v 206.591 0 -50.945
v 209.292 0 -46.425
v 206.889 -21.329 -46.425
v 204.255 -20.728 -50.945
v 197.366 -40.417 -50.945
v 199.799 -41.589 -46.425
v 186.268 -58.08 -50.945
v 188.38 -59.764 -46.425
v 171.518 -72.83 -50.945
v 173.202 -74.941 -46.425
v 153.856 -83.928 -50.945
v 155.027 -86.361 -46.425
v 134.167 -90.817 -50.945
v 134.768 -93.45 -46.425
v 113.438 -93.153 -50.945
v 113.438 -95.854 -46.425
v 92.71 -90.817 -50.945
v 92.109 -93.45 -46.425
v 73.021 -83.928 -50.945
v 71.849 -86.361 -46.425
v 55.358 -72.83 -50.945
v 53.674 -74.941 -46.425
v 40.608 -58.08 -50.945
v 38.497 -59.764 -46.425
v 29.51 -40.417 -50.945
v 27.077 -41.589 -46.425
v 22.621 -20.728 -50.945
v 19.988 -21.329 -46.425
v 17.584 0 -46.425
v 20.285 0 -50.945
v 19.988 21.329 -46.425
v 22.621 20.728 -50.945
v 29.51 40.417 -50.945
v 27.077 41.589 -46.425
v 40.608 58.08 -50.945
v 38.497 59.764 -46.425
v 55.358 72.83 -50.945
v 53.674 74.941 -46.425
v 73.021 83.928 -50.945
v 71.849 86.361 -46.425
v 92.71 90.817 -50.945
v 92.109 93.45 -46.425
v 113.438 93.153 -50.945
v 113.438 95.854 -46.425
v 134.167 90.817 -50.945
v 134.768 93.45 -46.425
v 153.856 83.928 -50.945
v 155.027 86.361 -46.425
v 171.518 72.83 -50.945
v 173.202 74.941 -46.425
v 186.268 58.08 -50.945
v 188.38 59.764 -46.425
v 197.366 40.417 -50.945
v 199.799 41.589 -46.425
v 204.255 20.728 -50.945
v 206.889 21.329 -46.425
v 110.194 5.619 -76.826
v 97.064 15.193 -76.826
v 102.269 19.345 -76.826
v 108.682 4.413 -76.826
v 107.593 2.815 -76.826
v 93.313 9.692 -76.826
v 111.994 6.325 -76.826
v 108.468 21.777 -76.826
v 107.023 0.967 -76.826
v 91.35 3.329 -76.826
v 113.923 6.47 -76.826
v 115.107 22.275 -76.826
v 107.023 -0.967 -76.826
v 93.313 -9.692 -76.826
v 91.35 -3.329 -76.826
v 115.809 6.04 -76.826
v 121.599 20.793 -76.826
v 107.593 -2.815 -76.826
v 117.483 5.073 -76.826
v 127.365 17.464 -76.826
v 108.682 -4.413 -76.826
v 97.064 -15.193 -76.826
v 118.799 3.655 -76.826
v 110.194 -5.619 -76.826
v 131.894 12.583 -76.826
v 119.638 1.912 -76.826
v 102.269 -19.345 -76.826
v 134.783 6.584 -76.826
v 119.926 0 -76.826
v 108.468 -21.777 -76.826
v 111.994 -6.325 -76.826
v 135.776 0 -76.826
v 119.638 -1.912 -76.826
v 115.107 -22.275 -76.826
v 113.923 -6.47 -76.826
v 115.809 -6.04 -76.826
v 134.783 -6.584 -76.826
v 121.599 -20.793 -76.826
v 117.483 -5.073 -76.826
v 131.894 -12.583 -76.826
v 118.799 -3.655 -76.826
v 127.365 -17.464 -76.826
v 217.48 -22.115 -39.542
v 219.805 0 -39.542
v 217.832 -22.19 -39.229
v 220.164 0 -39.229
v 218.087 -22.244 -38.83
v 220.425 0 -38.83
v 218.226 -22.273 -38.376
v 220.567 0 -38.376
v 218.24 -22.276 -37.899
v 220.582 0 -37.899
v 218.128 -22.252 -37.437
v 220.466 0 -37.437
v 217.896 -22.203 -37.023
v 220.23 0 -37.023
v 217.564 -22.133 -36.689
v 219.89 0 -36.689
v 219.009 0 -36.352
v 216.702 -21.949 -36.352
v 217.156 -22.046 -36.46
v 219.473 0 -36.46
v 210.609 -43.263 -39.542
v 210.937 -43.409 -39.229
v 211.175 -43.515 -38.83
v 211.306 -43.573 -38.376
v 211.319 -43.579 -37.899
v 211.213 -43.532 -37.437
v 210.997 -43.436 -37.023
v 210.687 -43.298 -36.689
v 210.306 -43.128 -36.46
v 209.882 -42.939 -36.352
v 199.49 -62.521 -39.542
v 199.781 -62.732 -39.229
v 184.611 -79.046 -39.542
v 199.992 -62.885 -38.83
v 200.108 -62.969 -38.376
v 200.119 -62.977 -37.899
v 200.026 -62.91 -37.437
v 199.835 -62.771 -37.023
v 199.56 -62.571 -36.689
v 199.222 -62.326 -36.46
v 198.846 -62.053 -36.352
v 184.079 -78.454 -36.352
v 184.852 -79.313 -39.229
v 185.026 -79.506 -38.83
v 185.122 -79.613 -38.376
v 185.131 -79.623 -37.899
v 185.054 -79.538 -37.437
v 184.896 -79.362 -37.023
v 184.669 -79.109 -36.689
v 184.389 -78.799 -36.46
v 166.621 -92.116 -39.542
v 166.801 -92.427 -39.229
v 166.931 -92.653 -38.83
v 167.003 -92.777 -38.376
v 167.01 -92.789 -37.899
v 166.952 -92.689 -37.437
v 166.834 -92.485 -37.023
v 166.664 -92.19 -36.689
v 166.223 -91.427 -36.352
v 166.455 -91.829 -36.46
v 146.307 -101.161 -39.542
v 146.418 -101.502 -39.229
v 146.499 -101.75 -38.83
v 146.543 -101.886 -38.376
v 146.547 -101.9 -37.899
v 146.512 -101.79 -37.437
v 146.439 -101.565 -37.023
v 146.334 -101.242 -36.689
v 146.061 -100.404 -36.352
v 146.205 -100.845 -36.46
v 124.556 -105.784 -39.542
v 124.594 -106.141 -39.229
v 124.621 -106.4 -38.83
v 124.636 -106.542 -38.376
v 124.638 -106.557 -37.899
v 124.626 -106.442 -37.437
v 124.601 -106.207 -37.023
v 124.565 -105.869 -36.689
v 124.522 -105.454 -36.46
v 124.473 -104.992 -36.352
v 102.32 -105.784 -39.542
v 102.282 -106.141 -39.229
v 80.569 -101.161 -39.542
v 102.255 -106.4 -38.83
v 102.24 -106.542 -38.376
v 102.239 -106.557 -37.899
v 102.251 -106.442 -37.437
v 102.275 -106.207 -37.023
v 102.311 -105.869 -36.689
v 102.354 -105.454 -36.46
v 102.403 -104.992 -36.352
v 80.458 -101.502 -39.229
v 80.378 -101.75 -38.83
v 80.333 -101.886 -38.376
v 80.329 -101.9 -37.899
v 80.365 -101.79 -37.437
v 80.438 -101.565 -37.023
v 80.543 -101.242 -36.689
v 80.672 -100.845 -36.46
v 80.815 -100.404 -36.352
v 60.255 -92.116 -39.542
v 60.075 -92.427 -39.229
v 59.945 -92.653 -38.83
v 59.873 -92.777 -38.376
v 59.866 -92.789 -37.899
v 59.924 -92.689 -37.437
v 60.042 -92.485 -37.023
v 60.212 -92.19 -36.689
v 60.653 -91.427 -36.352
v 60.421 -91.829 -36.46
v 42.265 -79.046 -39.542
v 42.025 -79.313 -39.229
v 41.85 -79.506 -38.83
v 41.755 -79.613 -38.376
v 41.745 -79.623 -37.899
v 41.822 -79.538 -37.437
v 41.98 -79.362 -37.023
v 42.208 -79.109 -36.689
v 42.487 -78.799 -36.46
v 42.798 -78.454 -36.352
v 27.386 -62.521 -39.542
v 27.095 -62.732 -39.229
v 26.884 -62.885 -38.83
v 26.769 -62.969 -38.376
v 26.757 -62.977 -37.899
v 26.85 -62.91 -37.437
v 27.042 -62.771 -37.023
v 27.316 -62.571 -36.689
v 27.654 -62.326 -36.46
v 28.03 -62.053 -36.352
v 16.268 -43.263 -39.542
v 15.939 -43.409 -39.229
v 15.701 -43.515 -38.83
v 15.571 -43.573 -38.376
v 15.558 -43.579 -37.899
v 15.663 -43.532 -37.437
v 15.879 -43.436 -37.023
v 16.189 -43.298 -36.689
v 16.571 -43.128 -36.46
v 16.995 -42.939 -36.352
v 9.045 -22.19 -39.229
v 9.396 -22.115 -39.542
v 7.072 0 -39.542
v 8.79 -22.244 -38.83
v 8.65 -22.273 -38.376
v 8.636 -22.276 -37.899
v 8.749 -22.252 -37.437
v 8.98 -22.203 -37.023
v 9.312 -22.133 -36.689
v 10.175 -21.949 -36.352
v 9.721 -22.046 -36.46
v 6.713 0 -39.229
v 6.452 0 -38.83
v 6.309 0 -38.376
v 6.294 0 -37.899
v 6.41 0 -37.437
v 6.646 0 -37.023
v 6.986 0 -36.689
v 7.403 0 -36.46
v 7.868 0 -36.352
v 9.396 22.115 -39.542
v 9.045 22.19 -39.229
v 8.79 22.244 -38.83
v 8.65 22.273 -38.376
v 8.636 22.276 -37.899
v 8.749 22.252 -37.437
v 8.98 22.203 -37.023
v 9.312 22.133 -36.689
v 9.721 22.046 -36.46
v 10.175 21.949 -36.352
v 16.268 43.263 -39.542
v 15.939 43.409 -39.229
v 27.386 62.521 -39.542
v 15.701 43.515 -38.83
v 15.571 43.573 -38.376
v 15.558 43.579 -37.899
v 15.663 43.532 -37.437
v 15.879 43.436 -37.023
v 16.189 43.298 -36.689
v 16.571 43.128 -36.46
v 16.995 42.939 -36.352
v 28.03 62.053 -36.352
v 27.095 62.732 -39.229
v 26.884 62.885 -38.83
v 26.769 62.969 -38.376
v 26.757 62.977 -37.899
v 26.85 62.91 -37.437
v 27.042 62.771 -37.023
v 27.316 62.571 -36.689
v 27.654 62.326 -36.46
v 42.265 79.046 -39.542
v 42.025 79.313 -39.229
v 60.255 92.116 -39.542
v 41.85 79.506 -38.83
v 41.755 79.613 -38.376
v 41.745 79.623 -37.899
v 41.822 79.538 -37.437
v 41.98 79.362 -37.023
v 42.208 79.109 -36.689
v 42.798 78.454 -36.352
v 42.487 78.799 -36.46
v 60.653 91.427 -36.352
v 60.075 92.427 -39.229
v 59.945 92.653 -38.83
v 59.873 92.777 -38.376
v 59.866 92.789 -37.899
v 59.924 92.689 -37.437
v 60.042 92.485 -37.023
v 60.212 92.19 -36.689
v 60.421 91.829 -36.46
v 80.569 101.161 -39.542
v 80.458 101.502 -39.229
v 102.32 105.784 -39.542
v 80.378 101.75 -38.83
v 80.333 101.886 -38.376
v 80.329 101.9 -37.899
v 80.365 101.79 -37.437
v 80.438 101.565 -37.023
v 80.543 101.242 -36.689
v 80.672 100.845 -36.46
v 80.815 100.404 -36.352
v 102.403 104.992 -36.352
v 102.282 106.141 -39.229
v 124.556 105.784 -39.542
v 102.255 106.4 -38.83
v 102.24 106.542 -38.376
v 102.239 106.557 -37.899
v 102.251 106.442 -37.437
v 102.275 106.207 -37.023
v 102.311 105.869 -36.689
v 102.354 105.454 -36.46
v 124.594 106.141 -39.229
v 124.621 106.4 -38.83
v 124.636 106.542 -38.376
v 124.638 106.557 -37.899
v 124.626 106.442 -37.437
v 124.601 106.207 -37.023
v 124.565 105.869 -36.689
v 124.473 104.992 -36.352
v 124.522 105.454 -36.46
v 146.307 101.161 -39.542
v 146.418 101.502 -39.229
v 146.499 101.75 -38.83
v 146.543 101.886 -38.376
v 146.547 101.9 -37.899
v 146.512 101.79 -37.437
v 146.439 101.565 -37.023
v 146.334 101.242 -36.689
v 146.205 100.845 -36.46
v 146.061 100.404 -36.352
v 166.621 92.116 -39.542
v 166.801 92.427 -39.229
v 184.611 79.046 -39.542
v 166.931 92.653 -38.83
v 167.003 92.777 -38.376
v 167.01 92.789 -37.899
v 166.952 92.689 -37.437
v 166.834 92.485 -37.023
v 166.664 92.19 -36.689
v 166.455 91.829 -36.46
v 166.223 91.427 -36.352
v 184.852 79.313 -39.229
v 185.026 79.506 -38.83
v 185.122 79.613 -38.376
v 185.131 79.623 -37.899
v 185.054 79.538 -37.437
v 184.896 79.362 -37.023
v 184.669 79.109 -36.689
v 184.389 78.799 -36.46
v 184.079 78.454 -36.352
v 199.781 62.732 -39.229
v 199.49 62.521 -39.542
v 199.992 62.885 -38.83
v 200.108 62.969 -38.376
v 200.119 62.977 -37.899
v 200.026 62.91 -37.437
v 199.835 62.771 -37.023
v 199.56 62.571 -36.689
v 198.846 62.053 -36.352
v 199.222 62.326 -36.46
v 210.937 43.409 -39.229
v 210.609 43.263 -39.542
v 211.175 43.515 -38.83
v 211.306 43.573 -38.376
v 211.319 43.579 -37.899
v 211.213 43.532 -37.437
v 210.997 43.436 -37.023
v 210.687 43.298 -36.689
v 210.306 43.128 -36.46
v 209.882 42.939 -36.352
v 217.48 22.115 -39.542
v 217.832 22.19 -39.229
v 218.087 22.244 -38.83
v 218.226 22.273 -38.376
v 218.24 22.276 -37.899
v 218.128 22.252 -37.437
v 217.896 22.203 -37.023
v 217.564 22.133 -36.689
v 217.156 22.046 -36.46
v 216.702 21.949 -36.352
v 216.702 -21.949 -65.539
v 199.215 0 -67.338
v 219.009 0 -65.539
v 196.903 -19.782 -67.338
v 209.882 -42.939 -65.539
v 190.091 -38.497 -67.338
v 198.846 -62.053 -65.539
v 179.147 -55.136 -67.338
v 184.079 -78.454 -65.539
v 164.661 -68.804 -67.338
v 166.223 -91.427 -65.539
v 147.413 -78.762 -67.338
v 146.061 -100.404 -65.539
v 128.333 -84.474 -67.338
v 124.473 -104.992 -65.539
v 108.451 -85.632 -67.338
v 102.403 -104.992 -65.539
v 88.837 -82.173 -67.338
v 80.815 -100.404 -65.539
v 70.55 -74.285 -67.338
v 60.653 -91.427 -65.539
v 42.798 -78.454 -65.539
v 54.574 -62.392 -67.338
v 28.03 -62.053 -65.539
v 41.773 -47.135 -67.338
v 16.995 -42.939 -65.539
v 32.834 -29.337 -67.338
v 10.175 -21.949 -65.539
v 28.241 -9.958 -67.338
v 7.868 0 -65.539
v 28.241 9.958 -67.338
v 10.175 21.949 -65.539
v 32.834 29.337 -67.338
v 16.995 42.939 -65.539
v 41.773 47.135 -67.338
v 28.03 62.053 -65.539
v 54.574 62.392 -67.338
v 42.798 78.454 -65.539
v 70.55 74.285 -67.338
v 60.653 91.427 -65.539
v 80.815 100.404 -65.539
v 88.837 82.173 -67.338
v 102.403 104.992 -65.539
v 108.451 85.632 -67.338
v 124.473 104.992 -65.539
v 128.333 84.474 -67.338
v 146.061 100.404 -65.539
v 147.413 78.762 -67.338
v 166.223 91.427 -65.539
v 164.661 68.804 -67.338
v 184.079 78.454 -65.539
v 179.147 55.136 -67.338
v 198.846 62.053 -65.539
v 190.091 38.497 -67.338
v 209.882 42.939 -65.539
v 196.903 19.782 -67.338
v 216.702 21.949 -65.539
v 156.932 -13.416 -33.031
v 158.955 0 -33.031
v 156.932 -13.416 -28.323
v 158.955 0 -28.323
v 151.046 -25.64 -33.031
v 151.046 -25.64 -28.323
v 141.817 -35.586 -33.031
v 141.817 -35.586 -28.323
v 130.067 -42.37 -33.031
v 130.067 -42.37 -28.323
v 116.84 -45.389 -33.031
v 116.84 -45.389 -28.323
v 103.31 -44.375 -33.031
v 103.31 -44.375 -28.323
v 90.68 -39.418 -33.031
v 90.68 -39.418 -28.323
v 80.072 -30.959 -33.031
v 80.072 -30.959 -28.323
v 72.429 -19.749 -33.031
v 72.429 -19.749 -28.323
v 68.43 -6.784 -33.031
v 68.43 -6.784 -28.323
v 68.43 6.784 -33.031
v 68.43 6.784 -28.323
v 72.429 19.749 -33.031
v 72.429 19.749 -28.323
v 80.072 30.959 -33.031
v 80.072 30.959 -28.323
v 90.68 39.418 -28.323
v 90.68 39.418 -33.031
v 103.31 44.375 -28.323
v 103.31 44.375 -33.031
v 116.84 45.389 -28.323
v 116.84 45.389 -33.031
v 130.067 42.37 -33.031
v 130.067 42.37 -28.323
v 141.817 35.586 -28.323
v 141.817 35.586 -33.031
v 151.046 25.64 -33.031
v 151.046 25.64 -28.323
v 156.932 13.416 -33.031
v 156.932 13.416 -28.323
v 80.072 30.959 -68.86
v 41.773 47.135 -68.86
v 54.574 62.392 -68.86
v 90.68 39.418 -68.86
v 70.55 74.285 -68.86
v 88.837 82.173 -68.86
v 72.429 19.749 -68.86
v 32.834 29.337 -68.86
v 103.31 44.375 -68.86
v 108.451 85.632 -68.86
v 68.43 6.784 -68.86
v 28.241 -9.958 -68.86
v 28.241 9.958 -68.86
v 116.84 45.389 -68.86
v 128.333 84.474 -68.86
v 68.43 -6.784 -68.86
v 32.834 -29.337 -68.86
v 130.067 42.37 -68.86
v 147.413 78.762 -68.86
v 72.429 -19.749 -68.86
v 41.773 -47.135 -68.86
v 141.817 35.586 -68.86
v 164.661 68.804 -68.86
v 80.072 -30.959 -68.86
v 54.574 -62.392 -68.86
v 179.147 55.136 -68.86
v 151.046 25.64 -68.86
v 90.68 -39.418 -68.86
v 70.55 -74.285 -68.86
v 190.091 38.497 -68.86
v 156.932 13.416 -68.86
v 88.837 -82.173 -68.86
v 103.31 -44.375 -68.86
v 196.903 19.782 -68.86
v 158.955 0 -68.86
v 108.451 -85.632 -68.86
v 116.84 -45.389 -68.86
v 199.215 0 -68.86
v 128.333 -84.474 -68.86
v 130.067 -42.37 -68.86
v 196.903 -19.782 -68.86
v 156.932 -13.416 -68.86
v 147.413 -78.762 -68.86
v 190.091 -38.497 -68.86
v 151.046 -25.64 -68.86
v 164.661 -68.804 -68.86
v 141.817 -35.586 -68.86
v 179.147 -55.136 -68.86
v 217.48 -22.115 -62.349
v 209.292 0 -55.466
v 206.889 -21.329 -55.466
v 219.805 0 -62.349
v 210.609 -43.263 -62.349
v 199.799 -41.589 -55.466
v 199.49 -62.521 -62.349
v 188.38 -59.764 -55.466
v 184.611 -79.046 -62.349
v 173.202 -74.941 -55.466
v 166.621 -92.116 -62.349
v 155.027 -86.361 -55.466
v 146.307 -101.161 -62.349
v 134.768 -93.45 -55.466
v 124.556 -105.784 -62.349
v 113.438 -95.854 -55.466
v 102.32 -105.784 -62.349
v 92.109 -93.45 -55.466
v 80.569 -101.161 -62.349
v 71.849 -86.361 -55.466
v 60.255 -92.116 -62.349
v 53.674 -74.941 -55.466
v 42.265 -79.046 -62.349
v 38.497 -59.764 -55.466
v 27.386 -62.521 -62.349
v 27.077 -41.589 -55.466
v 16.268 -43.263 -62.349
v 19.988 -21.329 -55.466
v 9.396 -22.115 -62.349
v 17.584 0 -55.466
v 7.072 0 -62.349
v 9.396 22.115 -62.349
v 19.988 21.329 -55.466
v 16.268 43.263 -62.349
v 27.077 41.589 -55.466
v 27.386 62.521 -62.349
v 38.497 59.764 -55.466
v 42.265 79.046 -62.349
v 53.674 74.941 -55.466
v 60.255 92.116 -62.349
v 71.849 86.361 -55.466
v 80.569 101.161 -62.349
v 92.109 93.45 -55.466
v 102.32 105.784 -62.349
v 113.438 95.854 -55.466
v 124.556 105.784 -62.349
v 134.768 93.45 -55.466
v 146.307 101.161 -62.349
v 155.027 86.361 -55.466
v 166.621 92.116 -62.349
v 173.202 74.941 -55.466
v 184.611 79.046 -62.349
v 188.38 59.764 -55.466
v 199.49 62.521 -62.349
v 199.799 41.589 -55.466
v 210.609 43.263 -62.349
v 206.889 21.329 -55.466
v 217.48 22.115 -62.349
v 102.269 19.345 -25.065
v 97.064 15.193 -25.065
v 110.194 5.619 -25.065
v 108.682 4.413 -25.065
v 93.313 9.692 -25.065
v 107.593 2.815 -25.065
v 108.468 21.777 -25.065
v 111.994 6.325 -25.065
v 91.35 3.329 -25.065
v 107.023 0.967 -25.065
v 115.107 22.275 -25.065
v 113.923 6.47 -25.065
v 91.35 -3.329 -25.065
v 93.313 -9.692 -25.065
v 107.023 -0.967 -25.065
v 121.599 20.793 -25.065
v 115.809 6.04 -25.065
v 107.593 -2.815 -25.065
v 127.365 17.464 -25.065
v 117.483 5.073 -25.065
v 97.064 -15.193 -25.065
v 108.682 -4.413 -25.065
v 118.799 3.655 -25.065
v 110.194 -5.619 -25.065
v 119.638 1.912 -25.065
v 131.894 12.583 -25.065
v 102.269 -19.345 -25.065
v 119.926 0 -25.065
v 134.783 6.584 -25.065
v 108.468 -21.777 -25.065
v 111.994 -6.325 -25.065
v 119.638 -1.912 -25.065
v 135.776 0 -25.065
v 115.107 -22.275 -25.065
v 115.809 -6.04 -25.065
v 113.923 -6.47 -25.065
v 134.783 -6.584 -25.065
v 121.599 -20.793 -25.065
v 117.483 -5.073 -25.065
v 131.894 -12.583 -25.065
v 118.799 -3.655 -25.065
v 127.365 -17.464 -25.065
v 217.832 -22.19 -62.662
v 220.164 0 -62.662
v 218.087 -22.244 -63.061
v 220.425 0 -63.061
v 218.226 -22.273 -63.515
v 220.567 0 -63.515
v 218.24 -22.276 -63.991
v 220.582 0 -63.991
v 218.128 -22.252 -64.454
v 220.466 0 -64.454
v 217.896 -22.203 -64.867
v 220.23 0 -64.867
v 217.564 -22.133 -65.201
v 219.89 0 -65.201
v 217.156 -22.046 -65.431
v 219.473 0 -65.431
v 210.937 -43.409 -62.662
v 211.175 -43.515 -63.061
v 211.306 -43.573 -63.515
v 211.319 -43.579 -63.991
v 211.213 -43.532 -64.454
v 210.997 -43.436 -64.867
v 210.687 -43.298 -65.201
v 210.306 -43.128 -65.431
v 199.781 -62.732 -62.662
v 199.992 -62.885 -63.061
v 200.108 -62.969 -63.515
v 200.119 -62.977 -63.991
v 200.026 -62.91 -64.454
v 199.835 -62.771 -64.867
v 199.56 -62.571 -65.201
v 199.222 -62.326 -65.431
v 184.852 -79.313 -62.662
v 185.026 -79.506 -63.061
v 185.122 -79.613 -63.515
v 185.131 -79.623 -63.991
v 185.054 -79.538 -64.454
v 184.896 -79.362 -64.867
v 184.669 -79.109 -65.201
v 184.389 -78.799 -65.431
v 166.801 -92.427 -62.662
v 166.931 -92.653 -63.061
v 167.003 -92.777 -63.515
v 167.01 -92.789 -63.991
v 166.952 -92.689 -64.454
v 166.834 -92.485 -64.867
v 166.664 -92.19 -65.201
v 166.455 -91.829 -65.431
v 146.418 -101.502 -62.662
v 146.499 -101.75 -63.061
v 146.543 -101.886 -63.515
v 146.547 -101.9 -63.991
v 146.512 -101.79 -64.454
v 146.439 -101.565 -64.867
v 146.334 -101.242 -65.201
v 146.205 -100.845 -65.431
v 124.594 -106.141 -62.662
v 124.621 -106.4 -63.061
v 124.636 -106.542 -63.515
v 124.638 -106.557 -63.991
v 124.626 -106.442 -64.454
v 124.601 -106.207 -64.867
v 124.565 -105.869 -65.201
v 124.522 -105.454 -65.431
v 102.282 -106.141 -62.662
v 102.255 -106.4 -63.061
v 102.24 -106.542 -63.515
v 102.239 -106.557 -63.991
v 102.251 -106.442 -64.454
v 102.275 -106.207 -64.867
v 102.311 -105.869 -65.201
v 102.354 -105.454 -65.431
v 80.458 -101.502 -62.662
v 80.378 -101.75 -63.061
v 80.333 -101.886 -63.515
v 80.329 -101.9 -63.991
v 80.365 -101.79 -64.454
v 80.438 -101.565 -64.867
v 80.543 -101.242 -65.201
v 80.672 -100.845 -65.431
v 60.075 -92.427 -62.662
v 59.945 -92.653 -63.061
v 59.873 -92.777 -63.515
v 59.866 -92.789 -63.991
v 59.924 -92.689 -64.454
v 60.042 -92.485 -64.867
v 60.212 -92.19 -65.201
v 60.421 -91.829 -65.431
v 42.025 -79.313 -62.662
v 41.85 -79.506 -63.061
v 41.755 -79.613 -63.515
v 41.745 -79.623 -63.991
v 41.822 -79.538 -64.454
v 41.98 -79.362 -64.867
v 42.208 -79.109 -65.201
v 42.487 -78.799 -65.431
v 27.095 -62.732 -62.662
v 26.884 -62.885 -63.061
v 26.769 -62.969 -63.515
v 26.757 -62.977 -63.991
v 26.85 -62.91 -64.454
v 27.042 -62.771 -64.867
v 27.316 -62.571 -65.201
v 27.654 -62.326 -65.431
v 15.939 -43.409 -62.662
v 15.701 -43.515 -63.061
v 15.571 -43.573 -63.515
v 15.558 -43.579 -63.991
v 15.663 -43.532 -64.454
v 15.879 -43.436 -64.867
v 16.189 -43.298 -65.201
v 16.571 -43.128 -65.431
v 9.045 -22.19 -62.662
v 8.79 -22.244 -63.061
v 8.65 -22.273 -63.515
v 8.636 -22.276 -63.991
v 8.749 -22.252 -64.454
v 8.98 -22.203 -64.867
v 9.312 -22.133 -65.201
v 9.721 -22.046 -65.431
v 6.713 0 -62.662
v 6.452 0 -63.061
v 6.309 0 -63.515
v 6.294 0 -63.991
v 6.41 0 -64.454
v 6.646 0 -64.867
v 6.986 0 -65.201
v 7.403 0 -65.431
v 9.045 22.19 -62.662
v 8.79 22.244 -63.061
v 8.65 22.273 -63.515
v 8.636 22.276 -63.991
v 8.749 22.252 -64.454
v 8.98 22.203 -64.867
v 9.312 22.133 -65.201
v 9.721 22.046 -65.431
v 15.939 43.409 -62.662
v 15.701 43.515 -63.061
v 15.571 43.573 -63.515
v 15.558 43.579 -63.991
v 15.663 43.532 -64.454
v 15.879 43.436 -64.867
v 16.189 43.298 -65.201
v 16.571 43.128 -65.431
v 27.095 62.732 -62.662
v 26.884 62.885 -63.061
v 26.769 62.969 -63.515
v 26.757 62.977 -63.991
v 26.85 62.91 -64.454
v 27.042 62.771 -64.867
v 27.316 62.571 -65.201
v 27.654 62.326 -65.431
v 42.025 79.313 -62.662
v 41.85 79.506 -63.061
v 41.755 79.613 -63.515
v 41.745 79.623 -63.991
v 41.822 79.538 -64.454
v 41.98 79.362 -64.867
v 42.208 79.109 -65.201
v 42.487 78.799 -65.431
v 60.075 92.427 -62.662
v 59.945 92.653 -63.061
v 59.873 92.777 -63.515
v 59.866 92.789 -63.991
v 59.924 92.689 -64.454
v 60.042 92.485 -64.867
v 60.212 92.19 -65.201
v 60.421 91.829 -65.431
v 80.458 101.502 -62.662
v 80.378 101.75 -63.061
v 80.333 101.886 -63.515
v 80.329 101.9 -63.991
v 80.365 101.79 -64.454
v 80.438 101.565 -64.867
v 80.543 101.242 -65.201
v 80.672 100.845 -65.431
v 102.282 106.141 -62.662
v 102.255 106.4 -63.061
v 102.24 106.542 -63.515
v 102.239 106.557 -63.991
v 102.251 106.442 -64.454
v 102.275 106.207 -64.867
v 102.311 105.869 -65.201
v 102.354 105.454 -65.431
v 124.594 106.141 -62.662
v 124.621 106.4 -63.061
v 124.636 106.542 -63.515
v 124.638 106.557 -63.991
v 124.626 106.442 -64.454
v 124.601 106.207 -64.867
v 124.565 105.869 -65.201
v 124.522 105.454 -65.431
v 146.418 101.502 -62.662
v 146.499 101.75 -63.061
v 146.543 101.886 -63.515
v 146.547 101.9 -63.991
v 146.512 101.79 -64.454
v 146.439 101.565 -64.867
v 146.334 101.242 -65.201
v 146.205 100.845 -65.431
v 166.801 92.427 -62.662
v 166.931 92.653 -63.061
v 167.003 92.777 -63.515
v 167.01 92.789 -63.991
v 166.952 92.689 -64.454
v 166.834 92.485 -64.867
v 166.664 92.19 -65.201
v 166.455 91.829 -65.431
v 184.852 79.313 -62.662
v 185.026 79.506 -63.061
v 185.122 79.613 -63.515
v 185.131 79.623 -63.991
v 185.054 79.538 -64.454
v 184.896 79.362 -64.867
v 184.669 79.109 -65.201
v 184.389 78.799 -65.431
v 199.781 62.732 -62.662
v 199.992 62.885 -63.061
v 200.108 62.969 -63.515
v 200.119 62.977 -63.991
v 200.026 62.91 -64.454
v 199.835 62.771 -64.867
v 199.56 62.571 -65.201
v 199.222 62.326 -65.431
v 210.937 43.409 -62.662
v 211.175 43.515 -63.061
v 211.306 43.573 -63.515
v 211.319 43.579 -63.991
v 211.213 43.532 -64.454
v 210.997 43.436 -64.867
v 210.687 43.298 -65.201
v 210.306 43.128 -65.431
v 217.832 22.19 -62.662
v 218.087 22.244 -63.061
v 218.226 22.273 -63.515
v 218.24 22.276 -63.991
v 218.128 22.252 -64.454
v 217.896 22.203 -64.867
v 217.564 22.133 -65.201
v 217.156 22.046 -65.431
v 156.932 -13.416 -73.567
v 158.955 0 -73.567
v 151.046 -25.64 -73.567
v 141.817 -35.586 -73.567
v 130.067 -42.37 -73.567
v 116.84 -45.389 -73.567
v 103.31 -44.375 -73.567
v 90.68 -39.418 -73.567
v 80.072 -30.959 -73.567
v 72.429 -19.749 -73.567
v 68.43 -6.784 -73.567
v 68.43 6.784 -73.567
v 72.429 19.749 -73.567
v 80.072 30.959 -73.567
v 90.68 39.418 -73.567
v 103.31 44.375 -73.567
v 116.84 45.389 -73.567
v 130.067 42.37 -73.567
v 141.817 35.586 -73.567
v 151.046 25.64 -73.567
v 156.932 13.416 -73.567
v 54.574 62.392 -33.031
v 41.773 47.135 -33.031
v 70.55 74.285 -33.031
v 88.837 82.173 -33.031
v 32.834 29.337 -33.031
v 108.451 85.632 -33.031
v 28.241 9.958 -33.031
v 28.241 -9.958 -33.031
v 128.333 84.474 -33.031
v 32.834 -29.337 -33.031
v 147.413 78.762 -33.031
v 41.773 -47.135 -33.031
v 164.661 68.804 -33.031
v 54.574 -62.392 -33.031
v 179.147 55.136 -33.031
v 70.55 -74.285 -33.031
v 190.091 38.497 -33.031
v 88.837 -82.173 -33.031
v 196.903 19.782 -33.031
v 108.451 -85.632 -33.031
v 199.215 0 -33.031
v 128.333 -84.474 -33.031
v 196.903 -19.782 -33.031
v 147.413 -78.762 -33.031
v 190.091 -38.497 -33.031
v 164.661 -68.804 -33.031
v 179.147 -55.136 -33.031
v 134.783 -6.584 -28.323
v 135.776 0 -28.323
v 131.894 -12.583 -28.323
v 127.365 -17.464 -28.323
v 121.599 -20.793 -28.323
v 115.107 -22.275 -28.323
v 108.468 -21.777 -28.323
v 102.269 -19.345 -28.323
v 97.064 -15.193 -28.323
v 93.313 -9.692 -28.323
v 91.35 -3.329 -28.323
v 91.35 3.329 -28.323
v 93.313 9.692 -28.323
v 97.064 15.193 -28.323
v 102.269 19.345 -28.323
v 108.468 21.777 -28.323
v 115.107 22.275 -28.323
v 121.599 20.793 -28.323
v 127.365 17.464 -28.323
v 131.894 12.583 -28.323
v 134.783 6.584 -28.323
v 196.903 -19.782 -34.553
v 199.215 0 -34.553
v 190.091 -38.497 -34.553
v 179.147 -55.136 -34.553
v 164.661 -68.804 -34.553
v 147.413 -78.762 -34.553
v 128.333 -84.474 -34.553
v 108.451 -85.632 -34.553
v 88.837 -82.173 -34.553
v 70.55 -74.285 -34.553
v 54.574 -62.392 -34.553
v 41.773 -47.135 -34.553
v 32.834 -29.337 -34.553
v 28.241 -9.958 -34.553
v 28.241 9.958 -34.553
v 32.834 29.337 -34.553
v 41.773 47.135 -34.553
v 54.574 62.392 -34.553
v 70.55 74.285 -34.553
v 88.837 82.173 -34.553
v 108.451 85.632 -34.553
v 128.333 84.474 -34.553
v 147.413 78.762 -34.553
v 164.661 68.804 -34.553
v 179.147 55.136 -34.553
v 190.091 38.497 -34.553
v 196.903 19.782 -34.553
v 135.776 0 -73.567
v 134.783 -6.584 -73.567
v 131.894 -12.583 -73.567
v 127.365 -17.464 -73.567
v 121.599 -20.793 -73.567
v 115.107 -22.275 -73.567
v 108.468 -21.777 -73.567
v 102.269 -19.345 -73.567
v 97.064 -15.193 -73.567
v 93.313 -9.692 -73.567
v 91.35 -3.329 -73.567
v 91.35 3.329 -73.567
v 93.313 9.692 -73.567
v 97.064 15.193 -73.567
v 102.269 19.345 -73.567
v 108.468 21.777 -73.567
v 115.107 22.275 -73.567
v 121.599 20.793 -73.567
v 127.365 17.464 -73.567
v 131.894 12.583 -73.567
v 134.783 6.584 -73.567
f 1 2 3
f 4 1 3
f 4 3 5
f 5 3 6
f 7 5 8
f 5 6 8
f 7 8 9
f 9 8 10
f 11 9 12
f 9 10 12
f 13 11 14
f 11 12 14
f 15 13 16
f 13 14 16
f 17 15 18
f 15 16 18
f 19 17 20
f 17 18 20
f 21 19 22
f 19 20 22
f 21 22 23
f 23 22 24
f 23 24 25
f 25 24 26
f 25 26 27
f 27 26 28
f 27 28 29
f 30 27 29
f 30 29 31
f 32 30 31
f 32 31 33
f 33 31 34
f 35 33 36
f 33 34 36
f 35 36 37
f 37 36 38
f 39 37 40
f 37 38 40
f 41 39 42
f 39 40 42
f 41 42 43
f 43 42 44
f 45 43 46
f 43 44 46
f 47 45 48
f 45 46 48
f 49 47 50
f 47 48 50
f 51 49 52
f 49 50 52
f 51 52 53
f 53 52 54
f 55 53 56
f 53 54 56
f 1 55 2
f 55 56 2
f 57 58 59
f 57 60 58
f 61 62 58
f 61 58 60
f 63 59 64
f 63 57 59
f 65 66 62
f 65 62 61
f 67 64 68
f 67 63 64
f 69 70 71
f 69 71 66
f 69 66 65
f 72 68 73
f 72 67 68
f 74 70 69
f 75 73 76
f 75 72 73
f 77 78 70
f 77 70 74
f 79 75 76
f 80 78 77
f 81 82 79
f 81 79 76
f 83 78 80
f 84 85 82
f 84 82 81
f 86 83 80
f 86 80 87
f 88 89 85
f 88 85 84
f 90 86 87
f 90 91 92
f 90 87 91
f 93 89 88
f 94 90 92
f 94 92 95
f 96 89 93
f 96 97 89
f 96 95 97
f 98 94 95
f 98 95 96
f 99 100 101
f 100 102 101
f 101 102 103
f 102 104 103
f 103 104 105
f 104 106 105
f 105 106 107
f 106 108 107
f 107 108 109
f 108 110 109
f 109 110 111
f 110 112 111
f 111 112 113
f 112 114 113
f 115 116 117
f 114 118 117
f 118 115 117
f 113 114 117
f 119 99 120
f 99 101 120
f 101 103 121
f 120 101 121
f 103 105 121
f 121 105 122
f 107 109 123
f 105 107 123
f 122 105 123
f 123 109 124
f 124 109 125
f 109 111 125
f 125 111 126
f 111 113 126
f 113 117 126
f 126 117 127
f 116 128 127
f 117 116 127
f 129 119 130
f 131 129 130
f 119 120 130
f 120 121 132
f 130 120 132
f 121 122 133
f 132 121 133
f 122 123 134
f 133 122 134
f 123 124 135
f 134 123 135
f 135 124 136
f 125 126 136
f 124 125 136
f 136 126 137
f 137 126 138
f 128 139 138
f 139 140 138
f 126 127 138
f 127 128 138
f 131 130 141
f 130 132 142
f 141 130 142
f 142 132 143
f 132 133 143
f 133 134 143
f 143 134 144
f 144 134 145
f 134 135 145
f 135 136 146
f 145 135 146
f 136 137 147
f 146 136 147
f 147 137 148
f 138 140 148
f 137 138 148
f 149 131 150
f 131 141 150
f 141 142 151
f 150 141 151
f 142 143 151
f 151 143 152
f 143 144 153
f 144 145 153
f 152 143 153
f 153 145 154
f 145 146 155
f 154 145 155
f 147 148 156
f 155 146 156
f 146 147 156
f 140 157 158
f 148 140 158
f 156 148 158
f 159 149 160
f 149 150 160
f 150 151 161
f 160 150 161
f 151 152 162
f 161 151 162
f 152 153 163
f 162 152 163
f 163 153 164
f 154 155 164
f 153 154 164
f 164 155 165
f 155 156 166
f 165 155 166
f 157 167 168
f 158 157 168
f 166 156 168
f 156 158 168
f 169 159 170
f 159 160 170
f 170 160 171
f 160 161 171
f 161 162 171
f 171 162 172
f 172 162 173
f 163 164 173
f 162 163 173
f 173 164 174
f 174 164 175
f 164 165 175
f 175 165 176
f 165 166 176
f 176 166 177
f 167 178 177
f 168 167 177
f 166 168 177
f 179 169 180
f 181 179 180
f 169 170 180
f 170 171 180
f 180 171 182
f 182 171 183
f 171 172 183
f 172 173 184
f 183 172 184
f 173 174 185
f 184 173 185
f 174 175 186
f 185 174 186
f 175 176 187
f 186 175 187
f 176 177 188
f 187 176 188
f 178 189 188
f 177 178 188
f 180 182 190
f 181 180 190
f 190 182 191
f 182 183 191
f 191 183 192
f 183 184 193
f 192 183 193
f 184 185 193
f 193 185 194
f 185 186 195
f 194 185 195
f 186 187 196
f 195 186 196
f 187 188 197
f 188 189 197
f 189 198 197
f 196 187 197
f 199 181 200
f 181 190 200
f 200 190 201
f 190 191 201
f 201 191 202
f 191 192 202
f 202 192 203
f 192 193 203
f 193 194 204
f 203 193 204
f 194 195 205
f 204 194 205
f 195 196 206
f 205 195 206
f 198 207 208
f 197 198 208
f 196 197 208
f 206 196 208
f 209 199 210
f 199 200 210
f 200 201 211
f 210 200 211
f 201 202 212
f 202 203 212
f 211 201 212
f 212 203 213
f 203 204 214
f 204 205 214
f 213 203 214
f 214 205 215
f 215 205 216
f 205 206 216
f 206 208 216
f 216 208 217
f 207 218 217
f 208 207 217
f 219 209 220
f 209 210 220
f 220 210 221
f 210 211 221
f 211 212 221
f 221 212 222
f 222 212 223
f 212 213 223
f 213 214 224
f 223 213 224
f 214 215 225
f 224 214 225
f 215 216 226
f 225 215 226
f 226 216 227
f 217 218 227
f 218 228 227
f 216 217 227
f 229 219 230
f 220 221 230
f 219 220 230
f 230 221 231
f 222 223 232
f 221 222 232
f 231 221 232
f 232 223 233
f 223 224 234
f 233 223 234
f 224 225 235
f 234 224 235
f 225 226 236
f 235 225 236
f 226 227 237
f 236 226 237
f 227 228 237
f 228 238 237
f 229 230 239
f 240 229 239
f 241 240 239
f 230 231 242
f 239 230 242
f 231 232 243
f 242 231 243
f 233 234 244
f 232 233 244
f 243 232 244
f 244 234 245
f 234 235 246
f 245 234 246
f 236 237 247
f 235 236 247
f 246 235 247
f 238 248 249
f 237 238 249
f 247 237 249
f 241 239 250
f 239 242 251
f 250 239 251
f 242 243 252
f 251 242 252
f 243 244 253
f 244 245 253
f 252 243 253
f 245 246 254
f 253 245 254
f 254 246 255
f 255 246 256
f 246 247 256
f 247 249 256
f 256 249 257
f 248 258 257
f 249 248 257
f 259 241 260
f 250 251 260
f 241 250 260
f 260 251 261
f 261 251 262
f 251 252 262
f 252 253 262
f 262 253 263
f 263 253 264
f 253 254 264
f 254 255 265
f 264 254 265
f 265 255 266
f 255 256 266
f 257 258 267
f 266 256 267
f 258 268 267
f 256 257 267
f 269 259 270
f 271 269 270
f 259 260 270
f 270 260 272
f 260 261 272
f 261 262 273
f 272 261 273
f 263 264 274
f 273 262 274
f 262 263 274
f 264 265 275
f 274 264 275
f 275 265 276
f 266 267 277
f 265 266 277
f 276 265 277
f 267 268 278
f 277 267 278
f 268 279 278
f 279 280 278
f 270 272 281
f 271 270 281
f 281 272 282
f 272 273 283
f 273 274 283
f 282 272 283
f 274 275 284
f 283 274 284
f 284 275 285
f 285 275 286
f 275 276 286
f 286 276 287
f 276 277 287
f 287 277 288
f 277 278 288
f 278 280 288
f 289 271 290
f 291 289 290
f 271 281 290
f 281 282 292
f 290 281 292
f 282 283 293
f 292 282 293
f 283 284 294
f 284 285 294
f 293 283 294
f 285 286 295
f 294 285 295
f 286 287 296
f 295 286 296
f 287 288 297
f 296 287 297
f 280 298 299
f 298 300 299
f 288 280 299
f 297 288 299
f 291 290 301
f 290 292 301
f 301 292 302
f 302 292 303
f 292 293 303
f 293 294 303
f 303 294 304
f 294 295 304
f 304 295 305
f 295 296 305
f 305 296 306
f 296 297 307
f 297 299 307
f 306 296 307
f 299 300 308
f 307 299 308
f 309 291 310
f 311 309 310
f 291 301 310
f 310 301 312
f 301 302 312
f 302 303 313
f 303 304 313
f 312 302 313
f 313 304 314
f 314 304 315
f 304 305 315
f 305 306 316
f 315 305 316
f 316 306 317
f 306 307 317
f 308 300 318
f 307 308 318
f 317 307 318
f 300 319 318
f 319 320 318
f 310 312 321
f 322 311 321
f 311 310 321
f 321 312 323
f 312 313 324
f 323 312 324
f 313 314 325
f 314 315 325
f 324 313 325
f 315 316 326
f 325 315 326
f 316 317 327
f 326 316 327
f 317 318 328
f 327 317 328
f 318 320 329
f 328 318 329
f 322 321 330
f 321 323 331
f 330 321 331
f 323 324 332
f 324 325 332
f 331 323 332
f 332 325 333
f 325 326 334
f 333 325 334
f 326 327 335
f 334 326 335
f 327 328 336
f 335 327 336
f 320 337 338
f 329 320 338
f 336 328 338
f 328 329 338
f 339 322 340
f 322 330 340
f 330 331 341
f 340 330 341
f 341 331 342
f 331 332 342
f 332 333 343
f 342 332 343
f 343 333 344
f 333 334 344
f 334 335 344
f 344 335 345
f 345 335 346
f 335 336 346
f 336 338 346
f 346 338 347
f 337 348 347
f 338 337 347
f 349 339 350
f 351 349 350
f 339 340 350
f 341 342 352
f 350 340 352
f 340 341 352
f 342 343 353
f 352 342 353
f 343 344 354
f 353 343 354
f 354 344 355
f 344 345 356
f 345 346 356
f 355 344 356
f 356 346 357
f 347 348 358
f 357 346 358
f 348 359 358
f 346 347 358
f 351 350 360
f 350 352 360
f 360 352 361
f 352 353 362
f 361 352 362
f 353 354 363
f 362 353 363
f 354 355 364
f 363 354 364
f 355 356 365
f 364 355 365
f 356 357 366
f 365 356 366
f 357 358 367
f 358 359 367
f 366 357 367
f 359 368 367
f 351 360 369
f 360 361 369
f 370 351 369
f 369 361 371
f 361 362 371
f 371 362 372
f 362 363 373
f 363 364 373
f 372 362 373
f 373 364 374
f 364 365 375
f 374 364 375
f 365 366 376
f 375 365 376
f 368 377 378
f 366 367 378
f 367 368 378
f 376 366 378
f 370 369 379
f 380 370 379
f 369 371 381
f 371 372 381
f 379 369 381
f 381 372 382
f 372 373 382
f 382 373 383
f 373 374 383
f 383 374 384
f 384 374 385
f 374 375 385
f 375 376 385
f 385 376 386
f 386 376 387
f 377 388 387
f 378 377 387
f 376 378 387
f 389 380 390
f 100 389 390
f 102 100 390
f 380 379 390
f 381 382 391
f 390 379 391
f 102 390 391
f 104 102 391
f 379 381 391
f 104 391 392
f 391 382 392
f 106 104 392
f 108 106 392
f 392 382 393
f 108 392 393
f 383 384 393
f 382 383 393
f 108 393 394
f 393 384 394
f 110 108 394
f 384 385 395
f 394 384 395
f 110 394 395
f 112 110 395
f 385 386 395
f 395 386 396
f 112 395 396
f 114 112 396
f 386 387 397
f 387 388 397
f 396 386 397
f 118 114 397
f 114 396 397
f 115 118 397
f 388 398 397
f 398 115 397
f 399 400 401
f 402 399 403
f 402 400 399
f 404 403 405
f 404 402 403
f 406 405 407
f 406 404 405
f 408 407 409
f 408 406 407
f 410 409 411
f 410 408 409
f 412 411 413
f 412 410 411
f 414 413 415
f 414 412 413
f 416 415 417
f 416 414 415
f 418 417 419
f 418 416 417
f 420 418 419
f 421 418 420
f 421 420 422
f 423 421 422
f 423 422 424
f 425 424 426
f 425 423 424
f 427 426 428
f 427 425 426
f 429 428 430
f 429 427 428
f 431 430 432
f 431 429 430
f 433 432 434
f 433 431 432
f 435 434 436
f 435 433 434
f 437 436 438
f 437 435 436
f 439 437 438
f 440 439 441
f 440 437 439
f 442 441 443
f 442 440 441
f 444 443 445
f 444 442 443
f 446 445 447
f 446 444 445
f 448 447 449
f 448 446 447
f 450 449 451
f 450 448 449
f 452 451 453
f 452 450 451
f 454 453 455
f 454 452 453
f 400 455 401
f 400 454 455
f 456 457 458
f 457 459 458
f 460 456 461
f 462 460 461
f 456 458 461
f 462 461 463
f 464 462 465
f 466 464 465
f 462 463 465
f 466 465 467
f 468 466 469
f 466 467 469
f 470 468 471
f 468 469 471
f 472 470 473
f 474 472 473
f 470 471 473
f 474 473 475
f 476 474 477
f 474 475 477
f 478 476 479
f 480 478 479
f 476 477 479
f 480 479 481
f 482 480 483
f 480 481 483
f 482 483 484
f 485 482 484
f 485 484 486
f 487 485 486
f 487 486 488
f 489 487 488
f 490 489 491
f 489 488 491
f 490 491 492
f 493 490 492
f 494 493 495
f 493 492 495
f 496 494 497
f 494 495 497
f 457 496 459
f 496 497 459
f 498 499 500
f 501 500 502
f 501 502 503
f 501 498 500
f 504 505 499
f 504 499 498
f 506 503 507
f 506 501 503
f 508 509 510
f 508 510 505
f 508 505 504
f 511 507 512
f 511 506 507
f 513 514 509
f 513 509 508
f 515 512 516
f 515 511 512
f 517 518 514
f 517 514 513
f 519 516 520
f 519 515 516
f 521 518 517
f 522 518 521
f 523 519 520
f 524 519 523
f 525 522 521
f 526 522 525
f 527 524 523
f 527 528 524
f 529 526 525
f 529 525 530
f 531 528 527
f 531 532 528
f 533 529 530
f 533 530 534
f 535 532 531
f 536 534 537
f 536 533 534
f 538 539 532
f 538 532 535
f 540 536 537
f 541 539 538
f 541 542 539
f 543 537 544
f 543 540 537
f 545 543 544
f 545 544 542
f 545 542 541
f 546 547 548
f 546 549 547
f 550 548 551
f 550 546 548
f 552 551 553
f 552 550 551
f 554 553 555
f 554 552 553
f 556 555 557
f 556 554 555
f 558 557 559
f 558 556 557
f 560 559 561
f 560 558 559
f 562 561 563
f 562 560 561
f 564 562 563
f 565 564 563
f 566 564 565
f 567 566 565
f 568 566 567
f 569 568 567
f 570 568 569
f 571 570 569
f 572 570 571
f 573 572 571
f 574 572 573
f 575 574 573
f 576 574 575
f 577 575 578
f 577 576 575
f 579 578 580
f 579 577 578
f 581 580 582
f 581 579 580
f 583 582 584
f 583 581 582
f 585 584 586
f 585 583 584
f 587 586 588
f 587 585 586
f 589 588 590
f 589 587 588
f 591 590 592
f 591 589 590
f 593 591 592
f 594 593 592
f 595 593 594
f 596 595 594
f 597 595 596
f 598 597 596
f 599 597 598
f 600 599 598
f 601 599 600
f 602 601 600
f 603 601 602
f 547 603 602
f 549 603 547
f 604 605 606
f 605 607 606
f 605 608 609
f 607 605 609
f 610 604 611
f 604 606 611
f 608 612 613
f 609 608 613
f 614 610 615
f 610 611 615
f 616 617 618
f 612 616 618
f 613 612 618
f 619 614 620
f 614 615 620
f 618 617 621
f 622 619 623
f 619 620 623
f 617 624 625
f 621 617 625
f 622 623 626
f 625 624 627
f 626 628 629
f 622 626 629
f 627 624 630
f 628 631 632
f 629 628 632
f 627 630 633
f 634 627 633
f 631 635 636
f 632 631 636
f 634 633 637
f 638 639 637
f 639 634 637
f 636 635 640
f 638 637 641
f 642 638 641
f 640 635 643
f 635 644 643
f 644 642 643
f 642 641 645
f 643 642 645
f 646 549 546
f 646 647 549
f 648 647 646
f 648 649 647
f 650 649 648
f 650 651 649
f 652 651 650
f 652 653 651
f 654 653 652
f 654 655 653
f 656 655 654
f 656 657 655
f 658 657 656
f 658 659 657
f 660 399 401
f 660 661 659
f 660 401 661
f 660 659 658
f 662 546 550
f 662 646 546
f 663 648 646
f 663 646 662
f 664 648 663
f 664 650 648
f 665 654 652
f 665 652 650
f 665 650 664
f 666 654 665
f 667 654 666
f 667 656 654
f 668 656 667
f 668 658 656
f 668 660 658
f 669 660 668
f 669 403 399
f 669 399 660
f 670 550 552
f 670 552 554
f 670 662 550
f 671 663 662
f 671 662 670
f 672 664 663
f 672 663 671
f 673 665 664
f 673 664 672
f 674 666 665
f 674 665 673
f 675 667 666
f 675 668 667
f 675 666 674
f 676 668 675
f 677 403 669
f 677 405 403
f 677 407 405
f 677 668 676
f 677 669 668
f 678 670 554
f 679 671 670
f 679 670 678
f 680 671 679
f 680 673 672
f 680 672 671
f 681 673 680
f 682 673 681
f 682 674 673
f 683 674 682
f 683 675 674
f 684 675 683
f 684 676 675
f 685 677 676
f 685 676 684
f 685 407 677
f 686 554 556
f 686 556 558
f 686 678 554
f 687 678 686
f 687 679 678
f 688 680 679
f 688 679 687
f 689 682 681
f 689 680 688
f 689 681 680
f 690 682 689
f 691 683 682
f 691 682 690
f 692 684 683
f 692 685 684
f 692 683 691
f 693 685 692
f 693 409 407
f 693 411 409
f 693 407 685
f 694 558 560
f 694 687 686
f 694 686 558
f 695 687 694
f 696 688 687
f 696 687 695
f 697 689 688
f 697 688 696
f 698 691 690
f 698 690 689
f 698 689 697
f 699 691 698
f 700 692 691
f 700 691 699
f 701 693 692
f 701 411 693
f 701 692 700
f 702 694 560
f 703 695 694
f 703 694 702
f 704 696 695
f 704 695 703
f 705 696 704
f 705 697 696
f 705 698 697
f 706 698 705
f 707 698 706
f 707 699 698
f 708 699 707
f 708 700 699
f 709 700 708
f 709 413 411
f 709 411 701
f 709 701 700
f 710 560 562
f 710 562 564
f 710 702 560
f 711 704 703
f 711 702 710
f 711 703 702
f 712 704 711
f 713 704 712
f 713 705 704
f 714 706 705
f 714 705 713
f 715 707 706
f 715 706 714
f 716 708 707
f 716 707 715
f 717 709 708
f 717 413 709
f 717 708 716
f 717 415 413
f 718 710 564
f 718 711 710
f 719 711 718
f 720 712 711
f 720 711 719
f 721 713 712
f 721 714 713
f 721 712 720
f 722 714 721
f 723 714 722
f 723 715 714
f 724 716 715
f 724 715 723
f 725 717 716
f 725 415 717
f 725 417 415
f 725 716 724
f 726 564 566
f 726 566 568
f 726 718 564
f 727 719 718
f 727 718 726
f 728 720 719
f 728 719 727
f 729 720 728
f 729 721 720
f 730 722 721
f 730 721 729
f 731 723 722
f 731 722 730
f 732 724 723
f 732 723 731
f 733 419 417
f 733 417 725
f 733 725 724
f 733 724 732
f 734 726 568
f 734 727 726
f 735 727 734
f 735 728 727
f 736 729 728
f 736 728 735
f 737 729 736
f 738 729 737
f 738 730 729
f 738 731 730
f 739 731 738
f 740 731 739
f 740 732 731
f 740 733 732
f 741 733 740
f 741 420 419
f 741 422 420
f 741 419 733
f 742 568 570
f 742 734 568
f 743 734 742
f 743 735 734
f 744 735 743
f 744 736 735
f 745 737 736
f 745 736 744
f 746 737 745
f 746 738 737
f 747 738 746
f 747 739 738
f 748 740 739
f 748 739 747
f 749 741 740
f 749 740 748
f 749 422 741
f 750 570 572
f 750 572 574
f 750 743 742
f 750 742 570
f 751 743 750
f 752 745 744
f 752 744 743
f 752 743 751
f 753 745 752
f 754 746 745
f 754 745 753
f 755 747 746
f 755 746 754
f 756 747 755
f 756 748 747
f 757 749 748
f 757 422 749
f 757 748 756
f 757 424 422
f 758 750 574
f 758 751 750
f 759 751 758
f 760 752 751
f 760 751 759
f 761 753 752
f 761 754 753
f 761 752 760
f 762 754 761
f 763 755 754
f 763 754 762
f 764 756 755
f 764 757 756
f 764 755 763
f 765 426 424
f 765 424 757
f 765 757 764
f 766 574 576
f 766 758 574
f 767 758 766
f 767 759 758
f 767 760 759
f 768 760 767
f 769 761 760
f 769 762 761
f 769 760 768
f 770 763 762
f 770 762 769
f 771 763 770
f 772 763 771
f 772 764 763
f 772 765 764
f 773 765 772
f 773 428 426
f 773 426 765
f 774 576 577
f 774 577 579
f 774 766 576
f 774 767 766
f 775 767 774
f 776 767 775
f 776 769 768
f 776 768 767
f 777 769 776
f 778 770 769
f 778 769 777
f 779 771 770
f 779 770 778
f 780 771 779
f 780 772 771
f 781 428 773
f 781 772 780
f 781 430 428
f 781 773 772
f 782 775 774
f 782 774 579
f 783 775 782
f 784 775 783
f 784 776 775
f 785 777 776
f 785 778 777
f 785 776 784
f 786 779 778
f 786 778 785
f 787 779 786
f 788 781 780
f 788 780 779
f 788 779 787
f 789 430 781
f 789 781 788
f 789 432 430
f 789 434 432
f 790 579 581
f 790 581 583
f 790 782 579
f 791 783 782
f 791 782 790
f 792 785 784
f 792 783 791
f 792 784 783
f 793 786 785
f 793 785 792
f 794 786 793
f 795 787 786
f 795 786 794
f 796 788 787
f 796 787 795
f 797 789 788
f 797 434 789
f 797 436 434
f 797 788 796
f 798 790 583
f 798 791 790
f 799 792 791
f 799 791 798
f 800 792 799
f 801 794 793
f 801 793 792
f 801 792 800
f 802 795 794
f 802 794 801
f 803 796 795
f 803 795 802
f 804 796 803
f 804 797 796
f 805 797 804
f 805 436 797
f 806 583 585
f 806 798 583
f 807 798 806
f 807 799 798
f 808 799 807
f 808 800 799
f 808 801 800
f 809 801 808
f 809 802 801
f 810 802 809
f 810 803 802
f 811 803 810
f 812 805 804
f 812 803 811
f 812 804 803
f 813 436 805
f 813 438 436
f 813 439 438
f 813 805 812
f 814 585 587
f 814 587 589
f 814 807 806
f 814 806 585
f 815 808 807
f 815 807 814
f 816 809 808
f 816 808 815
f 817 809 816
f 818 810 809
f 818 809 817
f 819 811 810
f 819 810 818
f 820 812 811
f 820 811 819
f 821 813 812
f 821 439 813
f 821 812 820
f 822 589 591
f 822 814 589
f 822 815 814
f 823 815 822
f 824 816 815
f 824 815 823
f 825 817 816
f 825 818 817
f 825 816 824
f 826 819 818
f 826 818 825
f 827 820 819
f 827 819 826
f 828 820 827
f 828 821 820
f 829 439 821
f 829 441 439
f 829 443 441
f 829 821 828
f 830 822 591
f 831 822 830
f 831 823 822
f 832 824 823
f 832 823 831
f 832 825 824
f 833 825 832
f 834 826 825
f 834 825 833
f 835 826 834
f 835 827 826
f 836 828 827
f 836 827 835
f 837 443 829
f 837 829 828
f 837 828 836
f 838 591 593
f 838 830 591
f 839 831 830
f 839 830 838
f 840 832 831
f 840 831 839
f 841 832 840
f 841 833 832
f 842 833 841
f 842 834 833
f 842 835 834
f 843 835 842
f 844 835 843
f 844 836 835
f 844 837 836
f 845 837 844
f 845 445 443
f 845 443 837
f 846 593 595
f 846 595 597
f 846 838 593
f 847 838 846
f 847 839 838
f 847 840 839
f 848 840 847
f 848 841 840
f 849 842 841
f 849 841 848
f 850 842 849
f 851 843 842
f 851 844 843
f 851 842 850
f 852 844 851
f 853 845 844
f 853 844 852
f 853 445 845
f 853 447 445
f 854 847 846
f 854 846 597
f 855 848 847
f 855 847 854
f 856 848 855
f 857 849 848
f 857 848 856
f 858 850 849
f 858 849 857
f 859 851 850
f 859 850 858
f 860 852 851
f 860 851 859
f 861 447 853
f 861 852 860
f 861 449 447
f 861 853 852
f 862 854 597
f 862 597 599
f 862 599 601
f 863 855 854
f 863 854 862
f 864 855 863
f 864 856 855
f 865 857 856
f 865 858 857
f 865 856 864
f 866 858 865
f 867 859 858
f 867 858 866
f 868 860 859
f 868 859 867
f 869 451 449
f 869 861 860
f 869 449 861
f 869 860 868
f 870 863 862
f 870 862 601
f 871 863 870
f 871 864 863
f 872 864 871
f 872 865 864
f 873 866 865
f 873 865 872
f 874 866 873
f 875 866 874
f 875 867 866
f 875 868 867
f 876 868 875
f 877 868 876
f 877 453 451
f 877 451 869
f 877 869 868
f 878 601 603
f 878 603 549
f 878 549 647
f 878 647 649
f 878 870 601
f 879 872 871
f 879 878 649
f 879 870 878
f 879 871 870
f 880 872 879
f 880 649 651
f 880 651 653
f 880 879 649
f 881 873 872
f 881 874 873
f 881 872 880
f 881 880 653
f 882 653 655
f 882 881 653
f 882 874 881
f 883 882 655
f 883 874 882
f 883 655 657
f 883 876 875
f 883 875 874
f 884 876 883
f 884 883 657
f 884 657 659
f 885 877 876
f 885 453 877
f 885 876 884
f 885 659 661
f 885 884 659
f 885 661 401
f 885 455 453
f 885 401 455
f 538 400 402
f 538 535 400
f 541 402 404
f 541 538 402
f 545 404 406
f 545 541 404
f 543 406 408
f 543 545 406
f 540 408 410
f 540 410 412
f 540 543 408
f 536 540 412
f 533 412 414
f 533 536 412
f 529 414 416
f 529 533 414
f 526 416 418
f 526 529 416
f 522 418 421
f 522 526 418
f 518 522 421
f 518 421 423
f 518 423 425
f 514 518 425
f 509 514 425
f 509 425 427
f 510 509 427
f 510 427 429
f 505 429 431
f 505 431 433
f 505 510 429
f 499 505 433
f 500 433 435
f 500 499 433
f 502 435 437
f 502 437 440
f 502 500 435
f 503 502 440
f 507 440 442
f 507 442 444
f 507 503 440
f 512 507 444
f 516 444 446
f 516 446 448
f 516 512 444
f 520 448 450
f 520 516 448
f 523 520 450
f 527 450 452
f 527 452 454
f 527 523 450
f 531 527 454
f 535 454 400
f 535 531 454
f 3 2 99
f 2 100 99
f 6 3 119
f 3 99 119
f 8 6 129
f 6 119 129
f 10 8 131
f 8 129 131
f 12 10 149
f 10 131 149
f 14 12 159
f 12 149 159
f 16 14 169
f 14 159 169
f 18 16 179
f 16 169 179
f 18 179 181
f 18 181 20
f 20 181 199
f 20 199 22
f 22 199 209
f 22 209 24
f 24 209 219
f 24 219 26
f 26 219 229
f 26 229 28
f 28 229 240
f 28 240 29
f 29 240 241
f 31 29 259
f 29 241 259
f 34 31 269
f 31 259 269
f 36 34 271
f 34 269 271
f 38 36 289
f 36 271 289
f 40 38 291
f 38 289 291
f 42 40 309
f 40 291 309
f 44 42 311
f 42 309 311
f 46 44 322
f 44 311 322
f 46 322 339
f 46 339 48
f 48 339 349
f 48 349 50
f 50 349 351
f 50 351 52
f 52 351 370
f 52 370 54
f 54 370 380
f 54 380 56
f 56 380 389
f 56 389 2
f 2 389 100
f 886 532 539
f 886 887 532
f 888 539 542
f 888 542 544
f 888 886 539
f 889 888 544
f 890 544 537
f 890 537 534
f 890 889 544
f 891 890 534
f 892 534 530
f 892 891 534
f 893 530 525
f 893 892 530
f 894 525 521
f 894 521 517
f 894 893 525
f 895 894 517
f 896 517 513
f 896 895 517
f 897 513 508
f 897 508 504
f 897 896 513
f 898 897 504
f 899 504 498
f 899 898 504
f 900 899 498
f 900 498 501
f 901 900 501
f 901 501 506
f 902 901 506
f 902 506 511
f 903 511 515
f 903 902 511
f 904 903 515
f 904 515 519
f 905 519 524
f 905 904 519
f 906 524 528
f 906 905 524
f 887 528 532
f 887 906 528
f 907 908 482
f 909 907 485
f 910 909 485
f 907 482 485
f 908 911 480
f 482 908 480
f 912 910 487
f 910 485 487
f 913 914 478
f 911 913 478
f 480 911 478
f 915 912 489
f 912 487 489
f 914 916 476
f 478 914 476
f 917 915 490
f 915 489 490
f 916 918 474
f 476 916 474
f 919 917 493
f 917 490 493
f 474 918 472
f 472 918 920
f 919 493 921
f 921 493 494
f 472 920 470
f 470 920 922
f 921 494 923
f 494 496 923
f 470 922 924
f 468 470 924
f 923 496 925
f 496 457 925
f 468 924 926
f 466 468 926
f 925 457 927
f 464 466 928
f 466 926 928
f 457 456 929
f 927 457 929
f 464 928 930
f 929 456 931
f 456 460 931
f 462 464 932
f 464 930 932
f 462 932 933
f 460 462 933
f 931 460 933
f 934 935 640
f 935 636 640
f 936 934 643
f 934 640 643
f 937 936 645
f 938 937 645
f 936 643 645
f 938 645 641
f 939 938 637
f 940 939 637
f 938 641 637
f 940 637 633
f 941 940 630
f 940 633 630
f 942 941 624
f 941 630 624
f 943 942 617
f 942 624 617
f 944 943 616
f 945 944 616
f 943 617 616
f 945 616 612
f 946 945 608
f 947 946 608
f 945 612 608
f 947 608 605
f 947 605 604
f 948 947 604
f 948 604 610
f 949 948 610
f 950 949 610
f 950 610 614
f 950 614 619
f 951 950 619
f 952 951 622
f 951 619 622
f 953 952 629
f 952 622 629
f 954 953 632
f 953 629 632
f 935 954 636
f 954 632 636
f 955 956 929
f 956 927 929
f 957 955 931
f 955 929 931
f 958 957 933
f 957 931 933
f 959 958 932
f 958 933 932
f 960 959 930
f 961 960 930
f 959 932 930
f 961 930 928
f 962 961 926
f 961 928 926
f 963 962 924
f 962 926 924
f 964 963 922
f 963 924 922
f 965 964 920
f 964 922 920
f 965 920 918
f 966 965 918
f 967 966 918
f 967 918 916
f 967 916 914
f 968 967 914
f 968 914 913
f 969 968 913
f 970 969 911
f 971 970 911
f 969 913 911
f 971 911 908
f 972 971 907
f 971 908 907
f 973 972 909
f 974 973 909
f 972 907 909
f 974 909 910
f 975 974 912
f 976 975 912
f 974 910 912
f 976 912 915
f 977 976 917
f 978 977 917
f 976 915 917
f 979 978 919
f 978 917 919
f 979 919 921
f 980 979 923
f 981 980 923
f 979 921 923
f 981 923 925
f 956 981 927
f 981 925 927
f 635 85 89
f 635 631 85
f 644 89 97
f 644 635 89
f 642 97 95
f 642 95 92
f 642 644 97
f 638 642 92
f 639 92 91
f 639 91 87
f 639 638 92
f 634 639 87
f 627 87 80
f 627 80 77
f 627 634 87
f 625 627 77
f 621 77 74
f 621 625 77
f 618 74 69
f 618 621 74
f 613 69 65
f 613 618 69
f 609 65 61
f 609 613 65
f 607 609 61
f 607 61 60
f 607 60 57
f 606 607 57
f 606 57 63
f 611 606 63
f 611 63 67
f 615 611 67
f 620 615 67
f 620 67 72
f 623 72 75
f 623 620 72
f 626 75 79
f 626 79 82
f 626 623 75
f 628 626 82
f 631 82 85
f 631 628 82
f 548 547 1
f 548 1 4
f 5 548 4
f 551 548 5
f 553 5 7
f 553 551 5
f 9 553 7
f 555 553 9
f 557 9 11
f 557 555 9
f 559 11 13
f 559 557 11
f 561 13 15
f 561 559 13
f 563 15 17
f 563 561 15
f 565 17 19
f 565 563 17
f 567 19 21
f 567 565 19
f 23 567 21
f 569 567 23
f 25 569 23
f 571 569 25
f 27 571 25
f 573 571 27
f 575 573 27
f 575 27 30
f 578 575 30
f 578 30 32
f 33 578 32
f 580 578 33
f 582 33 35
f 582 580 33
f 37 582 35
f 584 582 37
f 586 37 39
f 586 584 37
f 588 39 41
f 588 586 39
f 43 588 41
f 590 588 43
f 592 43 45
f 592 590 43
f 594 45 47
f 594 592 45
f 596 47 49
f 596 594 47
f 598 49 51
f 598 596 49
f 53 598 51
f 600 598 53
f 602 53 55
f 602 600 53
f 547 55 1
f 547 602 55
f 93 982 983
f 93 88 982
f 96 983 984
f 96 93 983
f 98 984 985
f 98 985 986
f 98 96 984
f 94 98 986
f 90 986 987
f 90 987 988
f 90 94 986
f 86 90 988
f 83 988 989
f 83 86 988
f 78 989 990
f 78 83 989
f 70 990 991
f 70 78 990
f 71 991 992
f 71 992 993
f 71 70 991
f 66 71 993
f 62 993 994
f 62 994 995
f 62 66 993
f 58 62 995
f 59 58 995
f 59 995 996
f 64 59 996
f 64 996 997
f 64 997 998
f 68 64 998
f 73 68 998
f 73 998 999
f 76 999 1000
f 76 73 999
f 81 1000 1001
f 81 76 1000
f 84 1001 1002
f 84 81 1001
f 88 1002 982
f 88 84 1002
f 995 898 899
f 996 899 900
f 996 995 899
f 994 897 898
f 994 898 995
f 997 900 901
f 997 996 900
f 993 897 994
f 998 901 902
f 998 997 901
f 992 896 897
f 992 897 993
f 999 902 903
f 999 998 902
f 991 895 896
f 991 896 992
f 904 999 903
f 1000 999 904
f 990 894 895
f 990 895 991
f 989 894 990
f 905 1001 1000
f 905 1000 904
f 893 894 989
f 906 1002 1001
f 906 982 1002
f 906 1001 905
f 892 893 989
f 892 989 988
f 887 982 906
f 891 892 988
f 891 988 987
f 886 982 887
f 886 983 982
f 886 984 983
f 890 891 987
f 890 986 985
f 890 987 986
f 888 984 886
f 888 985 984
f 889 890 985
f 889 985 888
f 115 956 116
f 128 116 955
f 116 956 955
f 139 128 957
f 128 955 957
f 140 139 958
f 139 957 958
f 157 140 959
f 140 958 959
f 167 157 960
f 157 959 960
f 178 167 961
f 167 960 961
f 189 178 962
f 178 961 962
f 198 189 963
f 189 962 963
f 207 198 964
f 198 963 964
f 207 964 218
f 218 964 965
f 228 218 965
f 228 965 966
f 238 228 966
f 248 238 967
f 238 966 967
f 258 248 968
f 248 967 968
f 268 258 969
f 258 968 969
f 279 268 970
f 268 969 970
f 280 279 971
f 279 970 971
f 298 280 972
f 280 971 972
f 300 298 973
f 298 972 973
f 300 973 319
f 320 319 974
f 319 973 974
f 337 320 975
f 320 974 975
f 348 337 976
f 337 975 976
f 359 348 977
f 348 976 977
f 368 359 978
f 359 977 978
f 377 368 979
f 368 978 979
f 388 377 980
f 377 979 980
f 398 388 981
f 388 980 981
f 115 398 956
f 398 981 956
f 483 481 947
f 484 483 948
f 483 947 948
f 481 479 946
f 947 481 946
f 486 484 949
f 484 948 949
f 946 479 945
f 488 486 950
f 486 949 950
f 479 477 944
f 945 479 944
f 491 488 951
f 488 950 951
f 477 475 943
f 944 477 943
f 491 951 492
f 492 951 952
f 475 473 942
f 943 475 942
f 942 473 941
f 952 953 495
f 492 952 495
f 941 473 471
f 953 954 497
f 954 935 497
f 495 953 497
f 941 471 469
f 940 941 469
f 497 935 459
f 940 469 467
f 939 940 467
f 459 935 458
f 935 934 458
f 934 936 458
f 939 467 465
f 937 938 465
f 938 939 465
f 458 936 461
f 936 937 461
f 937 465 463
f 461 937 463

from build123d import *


with BuildPart() as f1:
    # F0 (on Front) → F1 (revolve)
    with BuildSketch(Plane.XZ):
        with BuildLine():
            Line((119.9262216687, -50.9453676641), (206.5908610821, -50.9453676641))
            Line((206.5908610821, -50.9453676641), (209.2918008566, -46.4251749218))
            Line((209.2918008566, -46.4251749218), (219.8045918999, -39.5420951213))
            ThreePointArc((219.8045918999, -39.5420951213), (220.5400323468, -37.6643055384), (219.0086470441, -36.3521220821))
            Line((219.0086470441, -36.3521220821), (199.2150555966, -34.5528559543))
            Line((199.2150555966, -34.5528559543), (199.2150555966, -33.0305807292))
            Line((199.2150555966, -33.0305807292), (158.9545607567, -33.0305807292))
            Line((158.9545607567, -33.0305807292), (158.9545607567, -28.323341161))
            Line((158.9545607567, -28.323341161), (135.7756108046, -28.323341161))
            Line((135.7756108046, -28.323341161), (135.7756108046, -25.0646919012))
            Line((135.7756108046, -25.0646919012), (119.9262216687, -25.0646919012))
            Line((119.9262216687, -25.0646919012), (119.9262216687, -50.9453676641))
        make_face()
    revolve(axis=Axis((113.4381368756, 0, -32.0306840586), (0, 0, -1)))

    # F2: F1 across face


with BuildPart() as f1_1:
    add(f1.part)
    add(f1.part.mirror(Plane(origin=(113.4381368756, 0, -50.9453676641), x_dir=(1, 0, 0), z_dir=(0, 0, -1))))


solid = f1_1.part
